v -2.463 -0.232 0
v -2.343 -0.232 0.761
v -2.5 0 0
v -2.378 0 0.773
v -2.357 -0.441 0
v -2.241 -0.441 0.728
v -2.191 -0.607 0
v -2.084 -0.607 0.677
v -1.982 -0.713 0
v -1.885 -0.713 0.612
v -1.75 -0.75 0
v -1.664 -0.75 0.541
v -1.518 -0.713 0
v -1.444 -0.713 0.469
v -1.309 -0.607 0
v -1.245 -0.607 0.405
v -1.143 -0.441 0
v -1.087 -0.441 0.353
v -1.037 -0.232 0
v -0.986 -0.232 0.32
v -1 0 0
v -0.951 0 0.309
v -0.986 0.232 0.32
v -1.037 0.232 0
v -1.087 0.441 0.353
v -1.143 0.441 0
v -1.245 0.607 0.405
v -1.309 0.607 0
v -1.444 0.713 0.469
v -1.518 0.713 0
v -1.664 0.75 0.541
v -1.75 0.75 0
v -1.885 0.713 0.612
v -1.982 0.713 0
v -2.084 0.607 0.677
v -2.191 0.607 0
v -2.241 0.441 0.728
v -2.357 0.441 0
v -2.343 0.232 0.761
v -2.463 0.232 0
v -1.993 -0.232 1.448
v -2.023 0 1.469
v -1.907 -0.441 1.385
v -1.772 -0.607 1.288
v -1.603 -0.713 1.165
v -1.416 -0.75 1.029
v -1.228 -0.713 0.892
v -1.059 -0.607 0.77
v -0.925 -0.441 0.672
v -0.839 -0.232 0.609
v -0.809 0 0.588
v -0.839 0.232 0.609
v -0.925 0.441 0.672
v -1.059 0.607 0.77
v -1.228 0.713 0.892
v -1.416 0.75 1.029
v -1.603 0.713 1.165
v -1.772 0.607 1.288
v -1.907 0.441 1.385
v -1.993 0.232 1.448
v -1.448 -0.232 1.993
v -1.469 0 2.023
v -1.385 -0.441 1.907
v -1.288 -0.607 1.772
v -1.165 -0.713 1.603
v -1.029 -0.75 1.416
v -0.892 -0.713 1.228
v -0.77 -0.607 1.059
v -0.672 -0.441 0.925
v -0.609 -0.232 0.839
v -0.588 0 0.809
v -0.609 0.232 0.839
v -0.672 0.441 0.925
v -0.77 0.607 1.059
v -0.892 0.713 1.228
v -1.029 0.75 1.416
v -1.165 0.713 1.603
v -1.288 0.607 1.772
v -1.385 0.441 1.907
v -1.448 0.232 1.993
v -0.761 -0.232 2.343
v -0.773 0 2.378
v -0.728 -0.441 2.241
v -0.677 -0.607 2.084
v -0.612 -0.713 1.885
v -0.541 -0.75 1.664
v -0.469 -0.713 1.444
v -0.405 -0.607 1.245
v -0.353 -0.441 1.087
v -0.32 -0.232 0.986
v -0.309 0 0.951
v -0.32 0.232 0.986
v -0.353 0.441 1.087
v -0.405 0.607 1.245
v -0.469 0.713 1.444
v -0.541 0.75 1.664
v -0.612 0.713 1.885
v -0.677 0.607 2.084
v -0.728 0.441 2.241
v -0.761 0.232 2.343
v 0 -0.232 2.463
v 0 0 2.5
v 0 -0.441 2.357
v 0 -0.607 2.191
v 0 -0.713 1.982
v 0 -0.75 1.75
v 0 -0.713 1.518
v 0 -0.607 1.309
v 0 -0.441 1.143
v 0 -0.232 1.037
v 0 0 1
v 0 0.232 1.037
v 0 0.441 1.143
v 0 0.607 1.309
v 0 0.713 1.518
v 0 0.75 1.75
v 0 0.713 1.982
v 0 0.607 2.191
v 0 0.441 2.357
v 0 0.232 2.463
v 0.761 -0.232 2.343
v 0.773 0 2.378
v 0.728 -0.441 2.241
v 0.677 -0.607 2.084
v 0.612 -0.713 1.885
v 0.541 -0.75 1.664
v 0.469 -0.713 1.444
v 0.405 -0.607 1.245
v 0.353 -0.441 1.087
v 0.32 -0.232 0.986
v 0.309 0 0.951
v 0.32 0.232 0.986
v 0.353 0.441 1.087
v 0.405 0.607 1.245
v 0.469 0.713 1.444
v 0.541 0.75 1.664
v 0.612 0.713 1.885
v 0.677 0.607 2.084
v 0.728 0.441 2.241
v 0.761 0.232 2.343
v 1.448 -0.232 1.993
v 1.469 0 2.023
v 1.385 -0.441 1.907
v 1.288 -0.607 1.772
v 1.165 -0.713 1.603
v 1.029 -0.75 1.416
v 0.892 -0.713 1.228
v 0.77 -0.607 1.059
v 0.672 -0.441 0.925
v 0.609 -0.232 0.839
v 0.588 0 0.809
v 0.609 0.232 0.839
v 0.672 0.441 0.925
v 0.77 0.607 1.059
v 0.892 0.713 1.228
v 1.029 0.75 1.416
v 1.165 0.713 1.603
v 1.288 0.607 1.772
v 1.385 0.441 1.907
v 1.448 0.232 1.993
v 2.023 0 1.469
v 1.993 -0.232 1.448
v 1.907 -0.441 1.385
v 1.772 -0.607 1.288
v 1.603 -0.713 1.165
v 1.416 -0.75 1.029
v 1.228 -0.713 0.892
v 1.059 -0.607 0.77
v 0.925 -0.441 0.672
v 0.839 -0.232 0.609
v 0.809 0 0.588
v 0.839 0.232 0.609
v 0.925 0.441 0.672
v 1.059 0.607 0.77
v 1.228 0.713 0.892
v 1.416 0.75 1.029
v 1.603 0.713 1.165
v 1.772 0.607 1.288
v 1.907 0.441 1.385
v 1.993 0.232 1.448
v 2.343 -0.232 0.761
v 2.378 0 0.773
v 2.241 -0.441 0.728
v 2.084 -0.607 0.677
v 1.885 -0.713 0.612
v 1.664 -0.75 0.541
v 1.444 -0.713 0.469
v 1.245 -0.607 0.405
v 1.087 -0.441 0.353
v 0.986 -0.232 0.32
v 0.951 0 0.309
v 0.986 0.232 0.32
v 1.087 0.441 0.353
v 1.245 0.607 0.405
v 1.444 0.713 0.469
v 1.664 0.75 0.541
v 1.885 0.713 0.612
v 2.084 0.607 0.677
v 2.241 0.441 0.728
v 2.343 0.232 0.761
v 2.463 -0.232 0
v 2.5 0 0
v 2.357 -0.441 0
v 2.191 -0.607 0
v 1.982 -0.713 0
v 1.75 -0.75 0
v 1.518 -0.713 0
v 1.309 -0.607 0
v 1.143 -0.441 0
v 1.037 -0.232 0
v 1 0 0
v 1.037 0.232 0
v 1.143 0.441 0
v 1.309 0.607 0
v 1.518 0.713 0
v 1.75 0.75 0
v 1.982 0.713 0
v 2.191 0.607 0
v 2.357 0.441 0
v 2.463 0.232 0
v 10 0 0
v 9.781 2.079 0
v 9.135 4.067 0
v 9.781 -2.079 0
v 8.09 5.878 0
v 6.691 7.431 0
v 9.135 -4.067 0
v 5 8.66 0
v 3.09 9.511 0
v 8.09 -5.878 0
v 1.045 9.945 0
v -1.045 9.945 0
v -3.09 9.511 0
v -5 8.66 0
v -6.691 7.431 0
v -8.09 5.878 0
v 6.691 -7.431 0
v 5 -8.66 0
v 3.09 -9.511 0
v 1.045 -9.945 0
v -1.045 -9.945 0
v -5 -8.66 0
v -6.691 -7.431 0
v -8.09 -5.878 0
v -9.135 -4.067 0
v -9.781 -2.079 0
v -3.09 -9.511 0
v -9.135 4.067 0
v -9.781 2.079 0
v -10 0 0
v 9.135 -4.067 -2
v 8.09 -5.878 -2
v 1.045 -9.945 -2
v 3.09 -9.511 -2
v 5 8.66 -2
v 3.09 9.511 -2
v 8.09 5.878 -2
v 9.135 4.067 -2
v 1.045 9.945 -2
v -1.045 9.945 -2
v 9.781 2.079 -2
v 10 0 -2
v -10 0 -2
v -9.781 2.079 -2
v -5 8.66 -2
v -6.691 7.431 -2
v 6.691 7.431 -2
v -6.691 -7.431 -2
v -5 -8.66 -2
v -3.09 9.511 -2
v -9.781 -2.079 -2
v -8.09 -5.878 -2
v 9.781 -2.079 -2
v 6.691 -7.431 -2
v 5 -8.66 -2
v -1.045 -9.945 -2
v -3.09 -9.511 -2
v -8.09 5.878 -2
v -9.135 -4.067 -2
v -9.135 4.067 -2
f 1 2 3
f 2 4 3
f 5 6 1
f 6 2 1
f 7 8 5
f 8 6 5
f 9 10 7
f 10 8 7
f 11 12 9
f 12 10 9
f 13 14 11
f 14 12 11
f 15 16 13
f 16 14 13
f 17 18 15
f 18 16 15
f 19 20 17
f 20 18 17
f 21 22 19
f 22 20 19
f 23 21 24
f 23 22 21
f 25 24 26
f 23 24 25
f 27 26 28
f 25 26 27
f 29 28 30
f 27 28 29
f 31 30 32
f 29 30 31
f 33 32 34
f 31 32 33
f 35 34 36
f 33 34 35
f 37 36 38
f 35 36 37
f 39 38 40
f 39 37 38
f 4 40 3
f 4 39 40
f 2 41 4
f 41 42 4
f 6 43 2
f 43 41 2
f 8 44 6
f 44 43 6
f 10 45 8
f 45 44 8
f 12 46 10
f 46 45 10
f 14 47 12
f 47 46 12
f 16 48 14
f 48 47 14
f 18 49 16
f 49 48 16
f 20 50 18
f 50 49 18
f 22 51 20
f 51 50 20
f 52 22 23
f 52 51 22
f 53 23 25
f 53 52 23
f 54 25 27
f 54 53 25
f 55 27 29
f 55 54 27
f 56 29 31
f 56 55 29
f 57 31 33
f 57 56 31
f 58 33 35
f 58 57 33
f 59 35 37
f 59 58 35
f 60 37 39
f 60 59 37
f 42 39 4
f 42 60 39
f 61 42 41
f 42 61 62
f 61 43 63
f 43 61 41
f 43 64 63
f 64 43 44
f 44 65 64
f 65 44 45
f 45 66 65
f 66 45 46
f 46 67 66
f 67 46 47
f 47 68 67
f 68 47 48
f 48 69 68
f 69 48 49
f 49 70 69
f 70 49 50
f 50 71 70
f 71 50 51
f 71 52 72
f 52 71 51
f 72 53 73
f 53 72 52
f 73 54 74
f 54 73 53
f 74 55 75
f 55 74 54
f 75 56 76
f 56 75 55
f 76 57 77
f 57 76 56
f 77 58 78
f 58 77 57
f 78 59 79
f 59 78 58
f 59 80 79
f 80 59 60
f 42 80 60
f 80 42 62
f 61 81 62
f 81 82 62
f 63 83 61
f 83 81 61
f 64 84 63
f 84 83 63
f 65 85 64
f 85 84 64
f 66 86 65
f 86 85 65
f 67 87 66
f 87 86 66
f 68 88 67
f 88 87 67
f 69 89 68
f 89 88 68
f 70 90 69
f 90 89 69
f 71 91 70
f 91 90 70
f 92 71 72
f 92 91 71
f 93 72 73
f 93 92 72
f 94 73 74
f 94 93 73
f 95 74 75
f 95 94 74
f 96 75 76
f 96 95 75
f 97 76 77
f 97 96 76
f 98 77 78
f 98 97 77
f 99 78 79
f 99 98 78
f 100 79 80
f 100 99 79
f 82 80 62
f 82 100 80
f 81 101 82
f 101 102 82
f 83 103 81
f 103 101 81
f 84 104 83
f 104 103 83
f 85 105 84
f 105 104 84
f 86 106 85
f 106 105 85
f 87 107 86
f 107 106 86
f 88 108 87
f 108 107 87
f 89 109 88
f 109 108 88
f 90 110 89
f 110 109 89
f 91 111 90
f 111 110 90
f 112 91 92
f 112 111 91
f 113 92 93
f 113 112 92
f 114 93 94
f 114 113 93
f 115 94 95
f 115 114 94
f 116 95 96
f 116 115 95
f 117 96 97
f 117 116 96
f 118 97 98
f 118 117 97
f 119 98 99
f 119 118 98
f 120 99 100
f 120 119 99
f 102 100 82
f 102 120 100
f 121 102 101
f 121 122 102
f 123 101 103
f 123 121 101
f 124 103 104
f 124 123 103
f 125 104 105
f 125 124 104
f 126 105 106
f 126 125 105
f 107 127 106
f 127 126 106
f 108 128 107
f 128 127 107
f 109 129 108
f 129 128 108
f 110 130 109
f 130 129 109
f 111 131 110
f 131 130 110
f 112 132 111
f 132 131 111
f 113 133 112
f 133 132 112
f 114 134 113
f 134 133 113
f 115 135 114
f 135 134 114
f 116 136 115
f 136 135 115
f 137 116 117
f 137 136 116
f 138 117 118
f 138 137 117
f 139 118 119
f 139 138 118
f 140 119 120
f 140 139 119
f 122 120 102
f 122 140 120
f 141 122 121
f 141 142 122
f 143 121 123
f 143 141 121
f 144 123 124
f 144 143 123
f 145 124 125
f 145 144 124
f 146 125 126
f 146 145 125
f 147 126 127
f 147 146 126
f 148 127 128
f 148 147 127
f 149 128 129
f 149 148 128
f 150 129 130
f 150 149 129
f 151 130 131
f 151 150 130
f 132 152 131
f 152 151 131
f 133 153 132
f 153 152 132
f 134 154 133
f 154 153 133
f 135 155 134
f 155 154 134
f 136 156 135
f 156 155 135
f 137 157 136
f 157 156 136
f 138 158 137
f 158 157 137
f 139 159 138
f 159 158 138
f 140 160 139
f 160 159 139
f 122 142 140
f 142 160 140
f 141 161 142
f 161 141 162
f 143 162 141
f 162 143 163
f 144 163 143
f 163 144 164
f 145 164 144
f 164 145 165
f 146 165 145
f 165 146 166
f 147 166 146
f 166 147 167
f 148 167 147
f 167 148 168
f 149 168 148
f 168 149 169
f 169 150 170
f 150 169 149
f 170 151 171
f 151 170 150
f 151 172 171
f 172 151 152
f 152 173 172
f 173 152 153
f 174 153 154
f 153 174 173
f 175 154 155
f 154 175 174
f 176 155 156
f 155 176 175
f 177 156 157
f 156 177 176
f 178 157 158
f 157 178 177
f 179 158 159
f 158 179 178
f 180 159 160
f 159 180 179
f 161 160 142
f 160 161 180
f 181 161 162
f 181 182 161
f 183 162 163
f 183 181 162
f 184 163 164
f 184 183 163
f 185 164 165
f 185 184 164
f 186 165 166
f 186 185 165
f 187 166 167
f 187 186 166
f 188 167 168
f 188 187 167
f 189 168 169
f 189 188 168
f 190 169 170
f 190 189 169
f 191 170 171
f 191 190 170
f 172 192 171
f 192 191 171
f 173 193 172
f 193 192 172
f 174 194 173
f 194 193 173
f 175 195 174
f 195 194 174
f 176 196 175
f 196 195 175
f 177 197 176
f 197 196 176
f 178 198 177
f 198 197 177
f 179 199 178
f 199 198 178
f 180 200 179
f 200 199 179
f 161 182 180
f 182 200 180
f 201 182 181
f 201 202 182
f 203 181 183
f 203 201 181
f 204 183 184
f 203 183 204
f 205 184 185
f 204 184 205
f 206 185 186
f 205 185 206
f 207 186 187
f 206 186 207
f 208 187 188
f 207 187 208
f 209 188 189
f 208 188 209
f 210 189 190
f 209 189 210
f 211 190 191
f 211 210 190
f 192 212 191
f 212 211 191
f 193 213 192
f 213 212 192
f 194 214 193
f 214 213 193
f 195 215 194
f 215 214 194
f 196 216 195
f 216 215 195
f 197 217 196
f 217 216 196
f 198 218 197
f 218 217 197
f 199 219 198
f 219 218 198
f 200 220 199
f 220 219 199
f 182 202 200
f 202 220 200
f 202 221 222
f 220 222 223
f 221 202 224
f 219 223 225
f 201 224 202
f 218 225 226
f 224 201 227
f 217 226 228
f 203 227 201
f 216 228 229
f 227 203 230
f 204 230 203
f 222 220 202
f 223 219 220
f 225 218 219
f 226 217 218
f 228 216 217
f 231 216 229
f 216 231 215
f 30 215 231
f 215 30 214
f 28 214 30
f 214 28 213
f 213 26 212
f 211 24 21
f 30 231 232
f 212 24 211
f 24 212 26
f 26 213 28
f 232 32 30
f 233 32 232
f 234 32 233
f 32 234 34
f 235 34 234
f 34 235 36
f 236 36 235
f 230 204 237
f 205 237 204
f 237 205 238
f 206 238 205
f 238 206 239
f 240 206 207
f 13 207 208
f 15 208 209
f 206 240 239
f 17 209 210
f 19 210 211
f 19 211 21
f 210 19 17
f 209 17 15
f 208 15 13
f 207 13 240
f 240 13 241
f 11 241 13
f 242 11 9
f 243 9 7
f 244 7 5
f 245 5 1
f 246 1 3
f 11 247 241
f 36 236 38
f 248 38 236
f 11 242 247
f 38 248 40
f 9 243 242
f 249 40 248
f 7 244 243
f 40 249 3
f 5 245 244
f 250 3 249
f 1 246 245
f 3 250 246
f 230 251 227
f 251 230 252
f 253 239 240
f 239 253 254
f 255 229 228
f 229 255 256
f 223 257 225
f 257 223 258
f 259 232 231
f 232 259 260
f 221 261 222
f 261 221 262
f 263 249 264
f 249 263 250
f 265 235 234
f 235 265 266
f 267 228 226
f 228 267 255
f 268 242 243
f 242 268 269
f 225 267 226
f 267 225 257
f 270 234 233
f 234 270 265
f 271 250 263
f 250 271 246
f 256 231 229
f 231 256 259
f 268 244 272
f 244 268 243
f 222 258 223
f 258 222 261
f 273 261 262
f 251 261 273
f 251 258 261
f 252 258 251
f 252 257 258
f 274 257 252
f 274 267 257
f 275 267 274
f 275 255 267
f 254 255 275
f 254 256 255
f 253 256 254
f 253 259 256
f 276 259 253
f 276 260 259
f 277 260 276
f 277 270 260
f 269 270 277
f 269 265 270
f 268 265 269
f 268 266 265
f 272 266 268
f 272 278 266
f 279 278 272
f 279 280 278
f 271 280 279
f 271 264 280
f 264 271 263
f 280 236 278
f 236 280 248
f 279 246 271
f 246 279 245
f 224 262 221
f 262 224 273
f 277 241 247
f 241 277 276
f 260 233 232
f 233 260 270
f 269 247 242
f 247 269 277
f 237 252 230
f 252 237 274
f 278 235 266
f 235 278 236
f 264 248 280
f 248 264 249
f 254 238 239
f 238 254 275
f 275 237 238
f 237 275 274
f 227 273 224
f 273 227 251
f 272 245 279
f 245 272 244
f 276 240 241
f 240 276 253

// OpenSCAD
hookDiameter = 1.5;
hookInnerDiameter = 1;
hookFacets = 20;

baseDiameter = 20;
baseHeight = 2;
baseFacets = 50;

difference(){
    union() {
        rotate(a = [90,0,0])
            rotate_extrude(convexity = 10, $fn = hookFacets)
                translate([hookInnerDiameter + (hookDiameter / 2), 0, 0])
                    circle(d = hookDiameter, $fn = hookFacets);
    }
    
    mirror([0,0,1])
        cylinder(d=baseDiameter,h=(hookDiameter*2)+hookInnerDiameter);
}

mirror([0,0,1])
    cylinder(d=baseDiameter,h=baseHeight);
